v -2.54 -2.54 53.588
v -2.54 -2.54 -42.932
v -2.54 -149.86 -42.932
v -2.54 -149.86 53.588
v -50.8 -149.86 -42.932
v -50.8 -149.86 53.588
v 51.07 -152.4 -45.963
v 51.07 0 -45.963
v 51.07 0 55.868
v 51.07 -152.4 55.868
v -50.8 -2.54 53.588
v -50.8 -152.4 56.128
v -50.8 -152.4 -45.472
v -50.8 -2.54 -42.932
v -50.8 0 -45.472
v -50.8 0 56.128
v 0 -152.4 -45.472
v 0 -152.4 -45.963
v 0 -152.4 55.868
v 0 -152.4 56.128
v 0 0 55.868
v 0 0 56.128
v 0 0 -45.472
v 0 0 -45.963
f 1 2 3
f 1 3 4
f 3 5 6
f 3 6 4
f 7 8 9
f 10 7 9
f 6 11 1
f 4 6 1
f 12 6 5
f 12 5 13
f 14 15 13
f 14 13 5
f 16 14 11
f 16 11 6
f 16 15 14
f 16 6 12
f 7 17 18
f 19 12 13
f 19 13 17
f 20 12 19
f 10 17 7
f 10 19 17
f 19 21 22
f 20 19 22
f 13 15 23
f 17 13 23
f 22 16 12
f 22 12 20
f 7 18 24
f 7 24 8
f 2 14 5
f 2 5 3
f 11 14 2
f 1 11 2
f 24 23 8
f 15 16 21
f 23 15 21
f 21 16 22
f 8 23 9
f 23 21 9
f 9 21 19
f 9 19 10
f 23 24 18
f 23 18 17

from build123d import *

# Parameters (mm, degrees)
F0_W     = 50.8
F0_H     = 101.6
F1_DEPTH = 152.4
F2_T     = -2.54
F3_W     = 51.070213
F3_H     = 101.830907
F4_DEPTH = 152.4


with BuildPart() as f1:
    # F0 (on Front) → F1 (new body)
    with BuildSketch(Plane.XZ):
        with Locations((-25.4, 5.327806)):
            Rectangle(F0_W, F0_H)
    extrude(amount=F1_DEPTH)

    # F2
    f2_openings = [f1.faces().sort_by_distance(p)[0] for p in [
        (-50.8, -76.2, 5.327806),
    ]]
    offset(amount=F2_T, openings=f2_openings)

    # F3 (on Front) → F4 (join)
    with BuildSketch(Plane.XZ):
        with Locations((25.535106, 4.952264)):
            Rectangle(F3_W, F3_H)
    extrude(amount=F4_DEPTH)


solid = f1.part
